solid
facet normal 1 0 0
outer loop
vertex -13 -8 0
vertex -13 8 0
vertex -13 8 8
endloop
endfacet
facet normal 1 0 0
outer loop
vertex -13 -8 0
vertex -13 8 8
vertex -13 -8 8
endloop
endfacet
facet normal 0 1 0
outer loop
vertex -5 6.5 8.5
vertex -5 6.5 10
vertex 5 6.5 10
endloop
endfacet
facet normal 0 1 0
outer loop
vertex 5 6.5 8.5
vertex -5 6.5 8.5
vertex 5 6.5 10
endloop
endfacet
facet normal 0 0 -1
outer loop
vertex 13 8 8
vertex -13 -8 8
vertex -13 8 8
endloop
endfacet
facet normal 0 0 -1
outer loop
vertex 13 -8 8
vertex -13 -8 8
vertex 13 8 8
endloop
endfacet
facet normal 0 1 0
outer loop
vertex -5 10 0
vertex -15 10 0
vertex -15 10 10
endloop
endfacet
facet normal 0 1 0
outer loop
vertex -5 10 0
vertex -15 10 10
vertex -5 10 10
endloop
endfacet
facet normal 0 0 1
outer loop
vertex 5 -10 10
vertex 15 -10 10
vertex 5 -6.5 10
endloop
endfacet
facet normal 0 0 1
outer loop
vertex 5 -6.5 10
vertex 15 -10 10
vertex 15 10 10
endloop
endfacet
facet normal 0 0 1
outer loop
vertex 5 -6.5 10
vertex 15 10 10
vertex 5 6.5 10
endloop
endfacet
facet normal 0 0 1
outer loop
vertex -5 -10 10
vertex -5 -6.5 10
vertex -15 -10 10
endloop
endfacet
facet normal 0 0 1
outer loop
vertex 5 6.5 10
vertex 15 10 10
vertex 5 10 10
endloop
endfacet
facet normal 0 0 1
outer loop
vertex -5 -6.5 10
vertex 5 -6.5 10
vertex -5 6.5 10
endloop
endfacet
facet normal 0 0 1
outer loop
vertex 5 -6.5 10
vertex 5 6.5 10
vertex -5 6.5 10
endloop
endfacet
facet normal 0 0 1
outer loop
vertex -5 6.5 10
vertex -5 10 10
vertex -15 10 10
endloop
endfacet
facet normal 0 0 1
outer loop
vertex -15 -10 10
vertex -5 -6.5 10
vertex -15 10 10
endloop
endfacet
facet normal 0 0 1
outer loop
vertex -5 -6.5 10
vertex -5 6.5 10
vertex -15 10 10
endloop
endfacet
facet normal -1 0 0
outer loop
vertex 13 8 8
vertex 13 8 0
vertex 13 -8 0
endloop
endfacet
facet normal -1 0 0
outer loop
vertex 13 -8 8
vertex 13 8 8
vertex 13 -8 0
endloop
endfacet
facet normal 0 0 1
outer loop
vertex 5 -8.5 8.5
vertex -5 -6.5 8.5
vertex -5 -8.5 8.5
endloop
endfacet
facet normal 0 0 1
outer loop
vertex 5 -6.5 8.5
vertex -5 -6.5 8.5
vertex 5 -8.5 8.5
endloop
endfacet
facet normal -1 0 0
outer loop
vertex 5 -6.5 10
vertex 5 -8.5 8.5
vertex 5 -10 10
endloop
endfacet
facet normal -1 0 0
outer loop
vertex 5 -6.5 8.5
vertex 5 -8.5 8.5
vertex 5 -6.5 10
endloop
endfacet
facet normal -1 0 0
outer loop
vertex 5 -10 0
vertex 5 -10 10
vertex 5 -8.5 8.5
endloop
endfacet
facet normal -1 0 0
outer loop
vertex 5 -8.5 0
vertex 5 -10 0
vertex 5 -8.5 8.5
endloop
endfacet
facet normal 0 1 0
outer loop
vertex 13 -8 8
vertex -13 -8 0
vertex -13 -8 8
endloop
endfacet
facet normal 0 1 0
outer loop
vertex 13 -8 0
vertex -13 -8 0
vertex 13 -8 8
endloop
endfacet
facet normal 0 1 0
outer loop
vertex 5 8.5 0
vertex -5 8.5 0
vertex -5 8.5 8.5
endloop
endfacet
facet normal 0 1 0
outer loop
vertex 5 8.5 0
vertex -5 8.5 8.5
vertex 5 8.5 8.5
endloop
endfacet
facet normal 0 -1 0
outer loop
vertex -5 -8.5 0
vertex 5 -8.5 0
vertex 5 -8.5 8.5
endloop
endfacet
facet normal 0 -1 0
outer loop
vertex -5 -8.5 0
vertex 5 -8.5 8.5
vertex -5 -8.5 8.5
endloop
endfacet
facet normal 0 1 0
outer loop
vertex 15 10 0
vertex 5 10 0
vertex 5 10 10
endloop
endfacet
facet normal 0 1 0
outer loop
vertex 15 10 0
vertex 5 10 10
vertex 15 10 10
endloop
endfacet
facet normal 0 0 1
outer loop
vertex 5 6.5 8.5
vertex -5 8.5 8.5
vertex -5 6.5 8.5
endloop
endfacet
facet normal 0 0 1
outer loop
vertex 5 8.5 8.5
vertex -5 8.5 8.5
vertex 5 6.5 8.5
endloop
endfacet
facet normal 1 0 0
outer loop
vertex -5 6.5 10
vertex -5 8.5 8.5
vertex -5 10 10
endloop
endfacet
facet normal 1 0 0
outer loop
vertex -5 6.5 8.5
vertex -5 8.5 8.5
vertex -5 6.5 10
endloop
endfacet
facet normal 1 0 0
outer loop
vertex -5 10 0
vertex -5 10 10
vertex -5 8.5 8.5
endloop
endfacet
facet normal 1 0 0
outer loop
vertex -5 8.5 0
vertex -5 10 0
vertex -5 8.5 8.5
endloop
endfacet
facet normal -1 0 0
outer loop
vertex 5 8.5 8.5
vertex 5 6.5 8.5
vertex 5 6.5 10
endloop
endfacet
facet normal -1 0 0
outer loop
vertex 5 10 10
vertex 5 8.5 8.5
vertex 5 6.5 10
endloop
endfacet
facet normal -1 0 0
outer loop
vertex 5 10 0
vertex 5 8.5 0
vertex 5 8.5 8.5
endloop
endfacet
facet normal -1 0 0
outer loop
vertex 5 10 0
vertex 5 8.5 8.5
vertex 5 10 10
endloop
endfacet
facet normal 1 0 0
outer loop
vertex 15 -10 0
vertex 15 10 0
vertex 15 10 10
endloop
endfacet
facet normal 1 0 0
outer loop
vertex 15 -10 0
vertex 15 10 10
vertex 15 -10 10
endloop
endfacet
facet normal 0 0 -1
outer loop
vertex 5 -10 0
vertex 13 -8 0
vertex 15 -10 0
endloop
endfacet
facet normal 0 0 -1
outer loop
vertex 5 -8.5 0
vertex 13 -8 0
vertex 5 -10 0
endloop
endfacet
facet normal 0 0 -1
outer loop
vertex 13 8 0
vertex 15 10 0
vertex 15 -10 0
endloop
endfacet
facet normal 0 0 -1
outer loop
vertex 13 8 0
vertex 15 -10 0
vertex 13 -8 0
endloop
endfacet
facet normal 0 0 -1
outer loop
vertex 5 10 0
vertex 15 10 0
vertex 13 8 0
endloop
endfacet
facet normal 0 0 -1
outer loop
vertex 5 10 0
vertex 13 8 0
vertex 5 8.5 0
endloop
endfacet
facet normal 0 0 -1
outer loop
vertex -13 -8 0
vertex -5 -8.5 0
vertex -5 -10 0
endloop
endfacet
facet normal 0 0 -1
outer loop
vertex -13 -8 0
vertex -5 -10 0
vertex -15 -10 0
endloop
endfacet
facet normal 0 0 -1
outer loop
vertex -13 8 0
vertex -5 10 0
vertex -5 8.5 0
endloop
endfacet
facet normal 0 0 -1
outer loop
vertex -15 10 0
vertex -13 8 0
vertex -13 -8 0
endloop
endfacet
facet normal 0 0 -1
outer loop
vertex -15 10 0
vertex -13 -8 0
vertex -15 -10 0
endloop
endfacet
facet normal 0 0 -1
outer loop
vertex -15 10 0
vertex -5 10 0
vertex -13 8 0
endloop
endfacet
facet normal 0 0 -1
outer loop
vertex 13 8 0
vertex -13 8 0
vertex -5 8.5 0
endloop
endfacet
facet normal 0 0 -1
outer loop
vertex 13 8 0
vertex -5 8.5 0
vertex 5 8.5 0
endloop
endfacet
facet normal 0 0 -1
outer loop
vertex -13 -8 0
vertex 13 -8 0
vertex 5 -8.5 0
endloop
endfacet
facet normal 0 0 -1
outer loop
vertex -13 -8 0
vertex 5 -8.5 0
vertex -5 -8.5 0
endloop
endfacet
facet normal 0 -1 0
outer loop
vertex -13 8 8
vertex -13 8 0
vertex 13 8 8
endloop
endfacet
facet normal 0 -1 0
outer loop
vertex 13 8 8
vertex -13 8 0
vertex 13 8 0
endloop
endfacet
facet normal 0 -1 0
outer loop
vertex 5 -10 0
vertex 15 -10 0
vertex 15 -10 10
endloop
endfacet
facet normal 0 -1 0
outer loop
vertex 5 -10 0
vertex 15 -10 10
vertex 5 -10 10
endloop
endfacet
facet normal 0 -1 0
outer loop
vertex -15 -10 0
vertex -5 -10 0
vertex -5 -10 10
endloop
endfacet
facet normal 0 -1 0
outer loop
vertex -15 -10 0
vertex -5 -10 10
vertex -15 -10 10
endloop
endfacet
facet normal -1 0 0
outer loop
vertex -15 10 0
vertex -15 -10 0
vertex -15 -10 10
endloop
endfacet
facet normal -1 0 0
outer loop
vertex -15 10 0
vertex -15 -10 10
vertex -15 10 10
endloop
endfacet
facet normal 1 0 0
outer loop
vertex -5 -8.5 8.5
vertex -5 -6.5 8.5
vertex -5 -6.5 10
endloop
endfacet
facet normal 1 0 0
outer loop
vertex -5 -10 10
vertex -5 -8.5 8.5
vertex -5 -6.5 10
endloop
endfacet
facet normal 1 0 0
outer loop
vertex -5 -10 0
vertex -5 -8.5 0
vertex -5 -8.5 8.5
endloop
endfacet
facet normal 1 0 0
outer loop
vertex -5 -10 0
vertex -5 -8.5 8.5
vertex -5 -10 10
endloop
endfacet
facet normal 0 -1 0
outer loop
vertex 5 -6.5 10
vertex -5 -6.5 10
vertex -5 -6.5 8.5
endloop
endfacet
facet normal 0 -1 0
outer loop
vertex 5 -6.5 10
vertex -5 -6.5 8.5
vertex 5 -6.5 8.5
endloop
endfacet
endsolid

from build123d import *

# Parameters (mm, degrees)
PAD_DEPTH       = 10
SKETCH001_W     = 26
SKETCH001_H     = 16
POCKET_DEPTH    = 8
SKETCH002_W     = 10
SKETCH002_H     = 2
POCKET001_DEPTH = 1.5


with BuildPart() as part:
    # Sketch → Pad (new body)
    with BuildSketch(Plane.XY):
        Polygon((15, 10), (15, -10), (5, -10), (5, -8.5), (-5, -8.5), (-5, -10), (-15, -10), (-15, 10), (-5, 10), (-5, 8.5), (5, 8.5), (5, 10), align=None)
    extrude(amount=PAD_DEPTH)

    # Sketch001 (on Face13 of Pad) → Pocket (cut)
    with BuildSketch(Plane(origin=(0, 0, 0), x_dir=(1, 0, 0), z_dir=(0, 0, -1))):
        Rectangle(SKETCH001_W, SKETCH001_H)
    extrude(amount=-POCKET_DEPTH, mode=Mode.SUBTRACT)

    # Sketch002 (on Face5 of Pocket) → Pocket001 (cut)
    with BuildSketch(Plane.XY.offset(10)):
        with Locations((0, 7.5)):
            Rectangle(SKETCH002_W, SKETCH002_H)
        with Locations((0, -7.5)):
            Rectangle(SKETCH002_W, SKETCH002_H)
    extrude(amount=-POCKET001_DEPTH, mode=Mode.SUBTRACT)


solid = part.part
